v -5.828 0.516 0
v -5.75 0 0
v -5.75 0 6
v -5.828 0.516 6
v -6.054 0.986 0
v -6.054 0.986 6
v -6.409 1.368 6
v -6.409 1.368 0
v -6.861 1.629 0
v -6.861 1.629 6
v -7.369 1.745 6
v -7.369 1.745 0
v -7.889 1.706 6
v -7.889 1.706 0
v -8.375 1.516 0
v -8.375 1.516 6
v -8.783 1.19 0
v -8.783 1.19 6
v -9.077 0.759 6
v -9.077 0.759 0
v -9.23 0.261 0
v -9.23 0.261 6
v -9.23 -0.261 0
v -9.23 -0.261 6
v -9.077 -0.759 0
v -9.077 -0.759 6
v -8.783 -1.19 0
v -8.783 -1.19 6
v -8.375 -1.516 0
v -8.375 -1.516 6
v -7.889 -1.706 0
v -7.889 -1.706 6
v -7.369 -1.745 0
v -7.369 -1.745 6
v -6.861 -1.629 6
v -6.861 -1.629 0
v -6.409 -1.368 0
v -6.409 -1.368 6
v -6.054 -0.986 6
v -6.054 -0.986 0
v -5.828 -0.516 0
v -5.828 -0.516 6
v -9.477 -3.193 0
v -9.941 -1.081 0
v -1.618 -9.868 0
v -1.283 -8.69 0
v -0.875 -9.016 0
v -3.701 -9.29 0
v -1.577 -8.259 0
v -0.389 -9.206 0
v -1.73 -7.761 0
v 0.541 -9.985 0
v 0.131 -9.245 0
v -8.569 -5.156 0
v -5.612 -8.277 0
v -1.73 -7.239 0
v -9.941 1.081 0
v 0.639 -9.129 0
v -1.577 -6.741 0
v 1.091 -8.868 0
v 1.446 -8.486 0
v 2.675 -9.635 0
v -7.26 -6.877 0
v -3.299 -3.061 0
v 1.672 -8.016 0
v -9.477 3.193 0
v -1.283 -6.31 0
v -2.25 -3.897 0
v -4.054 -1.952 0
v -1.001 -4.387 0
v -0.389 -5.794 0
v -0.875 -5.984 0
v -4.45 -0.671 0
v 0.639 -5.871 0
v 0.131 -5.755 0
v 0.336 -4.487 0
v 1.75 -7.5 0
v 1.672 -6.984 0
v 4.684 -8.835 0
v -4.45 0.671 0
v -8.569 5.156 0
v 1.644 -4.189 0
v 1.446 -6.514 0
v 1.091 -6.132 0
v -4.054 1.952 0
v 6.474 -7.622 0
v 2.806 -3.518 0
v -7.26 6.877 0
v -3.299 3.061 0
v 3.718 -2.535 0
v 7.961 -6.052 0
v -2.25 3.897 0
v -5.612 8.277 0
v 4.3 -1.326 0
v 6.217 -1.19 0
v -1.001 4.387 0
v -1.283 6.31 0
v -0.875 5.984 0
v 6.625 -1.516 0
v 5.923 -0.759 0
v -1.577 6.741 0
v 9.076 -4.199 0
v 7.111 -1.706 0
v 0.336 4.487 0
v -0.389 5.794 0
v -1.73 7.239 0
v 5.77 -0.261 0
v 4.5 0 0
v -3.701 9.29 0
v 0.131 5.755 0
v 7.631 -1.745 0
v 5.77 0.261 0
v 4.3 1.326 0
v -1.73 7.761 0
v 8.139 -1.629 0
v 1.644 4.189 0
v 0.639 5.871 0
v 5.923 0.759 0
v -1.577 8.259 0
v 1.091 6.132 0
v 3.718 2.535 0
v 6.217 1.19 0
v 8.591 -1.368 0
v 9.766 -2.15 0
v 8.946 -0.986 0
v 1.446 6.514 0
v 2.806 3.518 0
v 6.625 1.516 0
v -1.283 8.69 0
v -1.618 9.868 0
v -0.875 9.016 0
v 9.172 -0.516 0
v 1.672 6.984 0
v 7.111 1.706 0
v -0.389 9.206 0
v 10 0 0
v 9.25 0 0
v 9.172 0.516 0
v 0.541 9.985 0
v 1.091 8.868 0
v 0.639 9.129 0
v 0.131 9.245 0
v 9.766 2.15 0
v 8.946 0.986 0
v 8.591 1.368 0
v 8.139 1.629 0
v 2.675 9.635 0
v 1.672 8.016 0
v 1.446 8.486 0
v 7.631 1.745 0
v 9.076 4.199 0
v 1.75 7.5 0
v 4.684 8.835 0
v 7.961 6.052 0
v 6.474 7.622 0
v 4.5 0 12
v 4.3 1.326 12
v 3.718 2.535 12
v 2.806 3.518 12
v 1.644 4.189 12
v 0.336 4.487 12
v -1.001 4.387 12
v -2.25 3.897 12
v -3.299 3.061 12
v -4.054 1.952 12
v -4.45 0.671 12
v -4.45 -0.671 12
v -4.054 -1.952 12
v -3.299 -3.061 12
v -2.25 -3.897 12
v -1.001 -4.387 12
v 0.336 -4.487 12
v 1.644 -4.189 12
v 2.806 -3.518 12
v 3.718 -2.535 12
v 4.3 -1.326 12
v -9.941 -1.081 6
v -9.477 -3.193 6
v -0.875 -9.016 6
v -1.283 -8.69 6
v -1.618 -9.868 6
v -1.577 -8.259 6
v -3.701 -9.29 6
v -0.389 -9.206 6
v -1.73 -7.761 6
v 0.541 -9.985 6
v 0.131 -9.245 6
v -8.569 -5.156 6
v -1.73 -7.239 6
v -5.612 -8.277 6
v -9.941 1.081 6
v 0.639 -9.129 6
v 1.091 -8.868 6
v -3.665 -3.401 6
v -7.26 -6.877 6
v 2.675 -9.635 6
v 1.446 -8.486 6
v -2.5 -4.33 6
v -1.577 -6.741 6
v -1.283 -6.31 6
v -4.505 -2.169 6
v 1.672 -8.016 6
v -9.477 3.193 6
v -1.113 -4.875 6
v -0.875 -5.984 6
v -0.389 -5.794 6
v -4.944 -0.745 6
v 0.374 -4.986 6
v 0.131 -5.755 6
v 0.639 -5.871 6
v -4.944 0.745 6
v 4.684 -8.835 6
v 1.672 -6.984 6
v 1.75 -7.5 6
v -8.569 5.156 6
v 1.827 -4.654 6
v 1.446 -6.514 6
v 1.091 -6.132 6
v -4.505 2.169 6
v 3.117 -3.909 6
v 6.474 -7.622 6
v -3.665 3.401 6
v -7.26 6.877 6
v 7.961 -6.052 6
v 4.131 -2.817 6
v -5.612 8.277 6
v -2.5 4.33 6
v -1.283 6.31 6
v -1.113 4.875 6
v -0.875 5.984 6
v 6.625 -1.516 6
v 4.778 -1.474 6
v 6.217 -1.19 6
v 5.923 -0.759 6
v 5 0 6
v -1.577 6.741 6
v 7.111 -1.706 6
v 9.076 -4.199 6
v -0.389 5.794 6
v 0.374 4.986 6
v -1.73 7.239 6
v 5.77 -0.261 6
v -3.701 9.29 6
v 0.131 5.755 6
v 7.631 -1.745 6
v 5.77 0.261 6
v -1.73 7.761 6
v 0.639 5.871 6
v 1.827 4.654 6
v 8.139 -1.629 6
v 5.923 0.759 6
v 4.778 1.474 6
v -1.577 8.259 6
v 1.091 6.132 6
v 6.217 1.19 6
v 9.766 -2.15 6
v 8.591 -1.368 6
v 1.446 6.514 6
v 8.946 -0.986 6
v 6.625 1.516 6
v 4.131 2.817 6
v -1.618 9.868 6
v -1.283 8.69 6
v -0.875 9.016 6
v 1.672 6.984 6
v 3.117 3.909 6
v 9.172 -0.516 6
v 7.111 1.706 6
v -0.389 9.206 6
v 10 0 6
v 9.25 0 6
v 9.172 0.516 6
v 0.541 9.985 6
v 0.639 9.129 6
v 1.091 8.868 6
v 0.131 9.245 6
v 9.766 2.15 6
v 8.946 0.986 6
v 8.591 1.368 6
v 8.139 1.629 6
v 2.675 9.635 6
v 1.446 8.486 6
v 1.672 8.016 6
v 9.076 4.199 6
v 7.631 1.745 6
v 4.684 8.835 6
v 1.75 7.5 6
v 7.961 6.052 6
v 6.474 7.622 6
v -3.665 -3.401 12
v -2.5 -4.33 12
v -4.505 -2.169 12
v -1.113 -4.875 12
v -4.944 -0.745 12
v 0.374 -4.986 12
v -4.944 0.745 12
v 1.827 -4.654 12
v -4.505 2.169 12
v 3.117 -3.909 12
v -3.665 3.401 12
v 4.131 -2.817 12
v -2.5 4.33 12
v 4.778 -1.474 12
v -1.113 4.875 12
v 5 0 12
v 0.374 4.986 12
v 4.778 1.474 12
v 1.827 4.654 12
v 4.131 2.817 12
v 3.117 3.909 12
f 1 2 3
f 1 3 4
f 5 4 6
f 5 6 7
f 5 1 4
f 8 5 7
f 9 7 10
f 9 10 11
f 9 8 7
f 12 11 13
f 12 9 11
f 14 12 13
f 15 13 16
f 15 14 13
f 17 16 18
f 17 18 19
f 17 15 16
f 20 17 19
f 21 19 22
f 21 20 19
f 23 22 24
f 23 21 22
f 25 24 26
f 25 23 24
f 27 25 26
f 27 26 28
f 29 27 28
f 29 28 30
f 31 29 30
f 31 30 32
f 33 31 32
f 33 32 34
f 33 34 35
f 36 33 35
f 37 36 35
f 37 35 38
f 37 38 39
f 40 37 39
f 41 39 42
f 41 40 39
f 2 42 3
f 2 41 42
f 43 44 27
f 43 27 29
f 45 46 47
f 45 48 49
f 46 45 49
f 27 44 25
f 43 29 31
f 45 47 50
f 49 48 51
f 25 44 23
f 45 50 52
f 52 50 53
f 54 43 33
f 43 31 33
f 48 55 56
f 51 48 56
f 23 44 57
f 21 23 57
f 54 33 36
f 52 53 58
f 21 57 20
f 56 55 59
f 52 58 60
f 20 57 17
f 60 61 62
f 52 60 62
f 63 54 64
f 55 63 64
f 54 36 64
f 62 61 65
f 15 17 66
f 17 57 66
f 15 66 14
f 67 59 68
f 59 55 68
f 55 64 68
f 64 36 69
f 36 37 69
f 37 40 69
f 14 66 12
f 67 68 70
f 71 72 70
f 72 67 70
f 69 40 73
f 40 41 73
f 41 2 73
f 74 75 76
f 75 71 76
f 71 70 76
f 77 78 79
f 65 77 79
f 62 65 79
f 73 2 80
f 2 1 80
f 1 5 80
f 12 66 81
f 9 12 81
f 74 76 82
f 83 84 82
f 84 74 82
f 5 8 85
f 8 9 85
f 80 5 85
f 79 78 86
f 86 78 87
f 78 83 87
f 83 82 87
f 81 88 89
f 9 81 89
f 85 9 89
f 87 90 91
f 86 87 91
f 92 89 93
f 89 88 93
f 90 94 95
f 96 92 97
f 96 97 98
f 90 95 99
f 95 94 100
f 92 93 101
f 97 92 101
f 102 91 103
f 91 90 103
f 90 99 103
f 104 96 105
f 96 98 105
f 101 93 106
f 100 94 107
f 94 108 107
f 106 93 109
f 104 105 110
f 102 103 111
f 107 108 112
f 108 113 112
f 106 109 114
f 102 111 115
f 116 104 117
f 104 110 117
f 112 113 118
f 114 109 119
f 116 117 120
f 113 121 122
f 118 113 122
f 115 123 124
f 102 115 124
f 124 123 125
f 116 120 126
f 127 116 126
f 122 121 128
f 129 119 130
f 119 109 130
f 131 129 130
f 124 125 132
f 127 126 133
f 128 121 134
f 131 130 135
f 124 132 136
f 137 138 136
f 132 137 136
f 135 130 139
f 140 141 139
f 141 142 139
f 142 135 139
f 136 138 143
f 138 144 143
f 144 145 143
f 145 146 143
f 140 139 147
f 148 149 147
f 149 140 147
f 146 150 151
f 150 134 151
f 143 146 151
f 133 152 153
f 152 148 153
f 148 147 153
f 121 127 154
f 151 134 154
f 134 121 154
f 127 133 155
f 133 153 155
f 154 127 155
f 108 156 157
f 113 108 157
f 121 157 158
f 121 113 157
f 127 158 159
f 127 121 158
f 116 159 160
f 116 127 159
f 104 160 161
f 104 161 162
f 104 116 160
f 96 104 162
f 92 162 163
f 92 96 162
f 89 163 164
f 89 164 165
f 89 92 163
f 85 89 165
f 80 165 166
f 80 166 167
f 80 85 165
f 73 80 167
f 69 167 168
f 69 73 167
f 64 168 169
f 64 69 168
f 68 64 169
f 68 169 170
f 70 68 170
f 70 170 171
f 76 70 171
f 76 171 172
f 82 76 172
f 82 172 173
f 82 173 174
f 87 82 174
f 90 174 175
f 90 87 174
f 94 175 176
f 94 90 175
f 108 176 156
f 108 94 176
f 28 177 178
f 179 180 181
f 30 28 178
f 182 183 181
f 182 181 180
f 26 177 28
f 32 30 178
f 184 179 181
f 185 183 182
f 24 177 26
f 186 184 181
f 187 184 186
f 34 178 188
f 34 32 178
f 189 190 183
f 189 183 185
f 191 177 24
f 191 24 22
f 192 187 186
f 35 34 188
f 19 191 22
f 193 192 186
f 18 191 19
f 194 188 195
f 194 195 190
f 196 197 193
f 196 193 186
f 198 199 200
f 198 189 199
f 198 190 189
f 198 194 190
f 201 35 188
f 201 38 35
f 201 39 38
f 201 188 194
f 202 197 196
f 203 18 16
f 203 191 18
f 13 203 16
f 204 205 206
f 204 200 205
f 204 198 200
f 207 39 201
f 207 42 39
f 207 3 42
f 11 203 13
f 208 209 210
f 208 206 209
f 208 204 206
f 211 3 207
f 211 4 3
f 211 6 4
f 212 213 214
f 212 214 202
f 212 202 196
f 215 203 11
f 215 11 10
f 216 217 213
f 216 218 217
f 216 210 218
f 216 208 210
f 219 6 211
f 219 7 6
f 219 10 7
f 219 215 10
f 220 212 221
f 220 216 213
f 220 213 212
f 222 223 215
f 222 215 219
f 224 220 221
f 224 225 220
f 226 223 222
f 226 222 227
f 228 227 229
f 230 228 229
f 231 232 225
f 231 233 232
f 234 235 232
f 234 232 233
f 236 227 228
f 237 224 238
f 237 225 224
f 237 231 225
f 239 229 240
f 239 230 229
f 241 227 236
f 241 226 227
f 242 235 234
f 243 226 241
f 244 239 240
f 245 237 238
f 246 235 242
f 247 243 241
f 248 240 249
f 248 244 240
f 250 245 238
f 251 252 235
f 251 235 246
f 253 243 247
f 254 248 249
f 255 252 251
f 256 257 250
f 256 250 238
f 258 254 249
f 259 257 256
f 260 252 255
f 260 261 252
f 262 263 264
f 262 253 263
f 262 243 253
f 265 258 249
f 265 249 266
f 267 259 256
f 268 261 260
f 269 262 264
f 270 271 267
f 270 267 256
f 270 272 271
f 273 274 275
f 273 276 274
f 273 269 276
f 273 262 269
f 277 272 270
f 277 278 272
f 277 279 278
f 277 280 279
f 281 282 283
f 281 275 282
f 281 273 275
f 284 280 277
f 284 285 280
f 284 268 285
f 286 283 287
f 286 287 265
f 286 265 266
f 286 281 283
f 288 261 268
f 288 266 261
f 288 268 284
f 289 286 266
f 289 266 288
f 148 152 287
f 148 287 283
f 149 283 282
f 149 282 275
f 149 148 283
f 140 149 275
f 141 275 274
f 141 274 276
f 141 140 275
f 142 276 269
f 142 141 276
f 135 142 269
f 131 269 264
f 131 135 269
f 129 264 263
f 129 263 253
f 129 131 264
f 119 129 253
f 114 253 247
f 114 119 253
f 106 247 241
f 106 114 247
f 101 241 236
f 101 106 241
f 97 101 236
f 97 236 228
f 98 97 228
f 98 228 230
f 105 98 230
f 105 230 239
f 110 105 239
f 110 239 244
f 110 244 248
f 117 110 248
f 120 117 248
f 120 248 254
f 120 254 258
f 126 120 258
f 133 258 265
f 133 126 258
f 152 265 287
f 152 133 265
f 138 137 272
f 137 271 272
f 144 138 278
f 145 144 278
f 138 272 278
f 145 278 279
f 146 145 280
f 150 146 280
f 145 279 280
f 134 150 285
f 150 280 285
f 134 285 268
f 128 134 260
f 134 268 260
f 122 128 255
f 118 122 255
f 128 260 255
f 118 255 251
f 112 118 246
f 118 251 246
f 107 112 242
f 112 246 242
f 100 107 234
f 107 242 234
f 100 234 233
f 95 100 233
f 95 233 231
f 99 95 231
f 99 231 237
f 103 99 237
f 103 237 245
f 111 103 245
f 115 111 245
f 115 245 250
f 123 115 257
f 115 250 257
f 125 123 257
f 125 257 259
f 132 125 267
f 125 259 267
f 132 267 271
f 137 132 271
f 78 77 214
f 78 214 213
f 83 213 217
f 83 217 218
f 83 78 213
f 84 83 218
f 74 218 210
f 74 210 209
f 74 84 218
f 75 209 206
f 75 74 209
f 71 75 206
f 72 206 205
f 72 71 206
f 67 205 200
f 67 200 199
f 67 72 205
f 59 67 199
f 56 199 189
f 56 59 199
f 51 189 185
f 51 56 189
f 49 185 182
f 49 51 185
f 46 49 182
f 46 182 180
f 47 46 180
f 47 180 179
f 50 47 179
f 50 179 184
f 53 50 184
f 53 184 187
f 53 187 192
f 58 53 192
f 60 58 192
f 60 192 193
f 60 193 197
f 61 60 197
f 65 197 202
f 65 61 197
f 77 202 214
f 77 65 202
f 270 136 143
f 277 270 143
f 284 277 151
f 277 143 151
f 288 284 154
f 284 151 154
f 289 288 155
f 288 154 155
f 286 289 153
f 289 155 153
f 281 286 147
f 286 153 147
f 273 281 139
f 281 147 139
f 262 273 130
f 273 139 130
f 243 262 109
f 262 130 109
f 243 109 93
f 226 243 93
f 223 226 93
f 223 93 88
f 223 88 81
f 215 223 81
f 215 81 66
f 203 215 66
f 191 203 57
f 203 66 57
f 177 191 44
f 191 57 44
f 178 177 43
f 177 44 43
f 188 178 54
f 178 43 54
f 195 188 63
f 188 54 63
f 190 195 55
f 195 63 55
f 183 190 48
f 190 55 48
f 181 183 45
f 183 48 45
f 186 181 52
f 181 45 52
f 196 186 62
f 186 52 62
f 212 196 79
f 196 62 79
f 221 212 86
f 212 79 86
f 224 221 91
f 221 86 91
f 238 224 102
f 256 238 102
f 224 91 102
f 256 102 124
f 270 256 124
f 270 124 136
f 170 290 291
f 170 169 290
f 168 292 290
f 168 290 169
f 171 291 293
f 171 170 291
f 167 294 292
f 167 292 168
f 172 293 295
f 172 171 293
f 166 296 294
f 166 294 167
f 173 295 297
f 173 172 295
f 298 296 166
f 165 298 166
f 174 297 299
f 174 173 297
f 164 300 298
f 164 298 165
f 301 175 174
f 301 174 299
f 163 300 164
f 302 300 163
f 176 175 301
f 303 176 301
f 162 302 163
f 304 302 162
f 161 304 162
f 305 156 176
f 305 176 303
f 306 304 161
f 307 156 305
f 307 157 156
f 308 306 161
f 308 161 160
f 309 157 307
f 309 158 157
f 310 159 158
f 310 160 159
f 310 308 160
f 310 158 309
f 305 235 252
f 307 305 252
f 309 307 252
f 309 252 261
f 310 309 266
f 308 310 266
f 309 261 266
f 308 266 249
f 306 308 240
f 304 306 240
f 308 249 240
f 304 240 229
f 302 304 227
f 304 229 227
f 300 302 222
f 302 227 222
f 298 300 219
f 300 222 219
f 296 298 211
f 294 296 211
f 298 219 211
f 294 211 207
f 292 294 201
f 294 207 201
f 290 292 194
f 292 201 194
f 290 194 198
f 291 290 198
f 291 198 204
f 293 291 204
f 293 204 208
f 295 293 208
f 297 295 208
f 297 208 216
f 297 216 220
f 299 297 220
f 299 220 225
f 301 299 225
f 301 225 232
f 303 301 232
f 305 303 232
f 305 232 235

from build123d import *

# Parameters (mm, degrees)
F1_R     = 10
F2_DEPTH = 6
F0_R     = 5
F0_R_2   = 4.5
F0_R_3   = 1.75
F3_DEPTH = 6
F4_DEPTH = 6
F7_DEPTH = 12


# Not quite as in the source:
# - the program builds the solid bodies; features that only make, move or delete a surface that nothing else refers to are left out


with BuildPart() as f2:
    # F1 (on Top) → F2 (new body)
    with BuildSketch(Plane.XY):
        Circle(F1_R)
    extrude(amount=F2_DEPTH)

    # F0 (on Top) → F3 (cut, symmetric)
    with BuildSketch(Plane.XY):
        Circle(F0_R)
        Circle(F0_R_2, mode=Mode.SUBTRACT)
        with Locations((0, 7.5)):
            Circle(F0_R_3)
        with Locations((-7.5, 0)):
            Circle(F0_R_3)
        with Locations((0, -7.5)):
            Circle(F0_R_3)
        with Locations((7.5, 0)):
            Circle(F0_R_3)
    extrude(amount=F3_DEPTH, both=True, mode=Mode.SUBTRACT)

    # F4 (cut): a face of the model
    f4_faces = [f2.faces().sort_by_distance(p)[0] for p in [
        (0, 0, 6),
    ]]
    extrude(f4_faces, amount=-F4_DEPTH, mode=Mode.SUBTRACT)

    # F0 (on Top) → F7 (join)
    with BuildSketch(Plane.XY):
        Circle(F0_R)
        Circle(F0_R_2, mode=Mode.SUBTRACT)
    extrude(amount=F7_DEPTH)


solid = f2.part
